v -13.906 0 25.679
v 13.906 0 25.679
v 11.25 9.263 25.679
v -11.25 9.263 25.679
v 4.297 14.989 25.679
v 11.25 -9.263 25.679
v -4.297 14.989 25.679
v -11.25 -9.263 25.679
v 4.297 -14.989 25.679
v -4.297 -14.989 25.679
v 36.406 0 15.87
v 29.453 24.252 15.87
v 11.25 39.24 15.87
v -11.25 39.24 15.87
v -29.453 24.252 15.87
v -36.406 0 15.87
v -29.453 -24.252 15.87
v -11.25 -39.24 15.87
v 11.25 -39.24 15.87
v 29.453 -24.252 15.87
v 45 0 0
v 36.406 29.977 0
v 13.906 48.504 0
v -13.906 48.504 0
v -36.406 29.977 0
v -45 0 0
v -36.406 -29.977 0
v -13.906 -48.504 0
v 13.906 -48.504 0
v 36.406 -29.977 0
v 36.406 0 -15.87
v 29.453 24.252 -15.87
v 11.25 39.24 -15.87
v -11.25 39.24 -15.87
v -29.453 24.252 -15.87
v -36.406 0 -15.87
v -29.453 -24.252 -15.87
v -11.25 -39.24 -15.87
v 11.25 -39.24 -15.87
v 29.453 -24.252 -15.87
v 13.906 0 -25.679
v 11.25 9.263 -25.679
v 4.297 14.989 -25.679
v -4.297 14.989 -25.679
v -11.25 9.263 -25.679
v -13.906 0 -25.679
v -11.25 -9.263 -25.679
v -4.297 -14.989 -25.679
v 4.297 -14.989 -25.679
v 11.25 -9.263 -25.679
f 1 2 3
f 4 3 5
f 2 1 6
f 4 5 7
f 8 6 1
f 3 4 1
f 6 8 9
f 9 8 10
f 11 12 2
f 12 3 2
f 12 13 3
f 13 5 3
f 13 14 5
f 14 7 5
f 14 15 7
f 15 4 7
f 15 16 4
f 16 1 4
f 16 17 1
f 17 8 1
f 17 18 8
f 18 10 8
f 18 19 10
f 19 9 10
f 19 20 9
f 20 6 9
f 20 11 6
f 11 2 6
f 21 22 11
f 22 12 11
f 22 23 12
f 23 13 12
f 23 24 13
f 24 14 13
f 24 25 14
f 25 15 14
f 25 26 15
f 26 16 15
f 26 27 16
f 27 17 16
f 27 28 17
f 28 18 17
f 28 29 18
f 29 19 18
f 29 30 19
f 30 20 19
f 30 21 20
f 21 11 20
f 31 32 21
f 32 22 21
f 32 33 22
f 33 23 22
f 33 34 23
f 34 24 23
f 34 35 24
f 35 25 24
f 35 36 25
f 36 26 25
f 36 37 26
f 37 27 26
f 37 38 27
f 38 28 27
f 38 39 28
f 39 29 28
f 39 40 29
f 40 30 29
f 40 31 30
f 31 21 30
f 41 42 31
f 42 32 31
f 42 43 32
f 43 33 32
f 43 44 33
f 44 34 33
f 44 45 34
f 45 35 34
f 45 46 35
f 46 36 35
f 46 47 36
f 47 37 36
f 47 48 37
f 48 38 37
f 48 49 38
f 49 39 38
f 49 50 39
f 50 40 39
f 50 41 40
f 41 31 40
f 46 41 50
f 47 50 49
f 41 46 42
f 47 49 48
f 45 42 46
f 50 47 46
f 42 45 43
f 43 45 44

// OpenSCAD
// Generated by SolidPython 1.0.1 on 2020-07-29 00:46:52


scale(v = [15, 17, 9]) {
	sphere(r = 3);
}
/***********************************************
*********      SolidPython code:      **********
************************************************
 
# import packages: SolidPython
from solid import *
from solid.utils import *
from itertools import chain, combinations, permutations


class Resize:

    def __init__(self, scad_file):
        self.scad_file = scad_file
        #self.scad_file = import_scad(scad_file)
        # cone/cylinder param:
        self.r1 = 0
        self.r2 = 0
        self.h = 0
        # rectangular prism param:
        self.w = 0
        self.l = 0
        # ellipse param:
        self.r = 0

    # import OpenScad code (file name corresponds to shape)


    # classify shape + parameters
    def assign(self, param1, param2, param3):
        if self.scad_file == 'cone.scad':
            self.r1 = param1
            self.r2 = param2
            self.h = param3
        elif self.scad_file == 'cylinder.scad':
            self.r1 = param1
            self.r2 = param2
            self.h = param3
        elif self.scad_file == 'rectangularPrism.scad':
            self.h = param1
            self.l = param2
            self.w = param3
        else:
            self.r = param1
            self.h = param2

    # resize parameters
    def iterate(self):
        x = range(3, 20, 2)
        i = 1
        if self.scad_file == 'cone.scad':
            tempList = list(permutations(x, 2))
            for temp in tempList:
                param1 = temp[0]
                param2 = temp[1]
                filepath = 'produced_scad_files/' + 'cone' + str(param1) + '_' + str(param2) + '_' + '.scad'
                scad_render_to_file(cylinder(h=param1, r1=param2, r2=0), filepath)

        elif self.scad_file == 'cylinder.scad':
            tempList = list(permutations(x, 3))
            for temp in tempList:
                param1 = temp[0]
                param2 = temp[1]
                filepath = 'produced_scad_files/' + 'cylinder' + str(param1) + '_' + str(param2) + '_' + '.scad'
                scad_render_to_file(cylinder(h=param1, r1=param2, r2=param2), filepath)

        elif self.scad_file == 'rectangularPrism.scad':
            tempList = list(permutations(x, 3))
            for temp in tempList:
                param1 = temp[0]
                param2 = temp[1]
                param3 = temp[2]
                filepath = 'produced_scad_files/' + 'rectangularPrism' + str(param1) + '_' + str(param2) + '_' + str(
                    param3) + '.scad'
                scad_render_to_file(cube(size=(param1, param2, param3)), filepath)

        elif self.scad_file == 'ellipse.scad':
            tempList = list(permutations(x, 4))
            for temp in tempList:
                param1 = temp[0]
                param2 = temp[1]
                param3 = temp[2]
                param4 = temp[3]
                filepath = 'produced_scad_files/' + 'ellipse' + str(param1) + '_' + str(param2) + '_' + str(param3) + '_' + str(param4) + '.scad'
                scad_render_to_file(scale([param1, param2, param3])(sphere(r=param4)), filepath)

    def render_to_scadfile(self):
        scad_render_to_file(scad, 'example.scad') 
 
************************************************/
